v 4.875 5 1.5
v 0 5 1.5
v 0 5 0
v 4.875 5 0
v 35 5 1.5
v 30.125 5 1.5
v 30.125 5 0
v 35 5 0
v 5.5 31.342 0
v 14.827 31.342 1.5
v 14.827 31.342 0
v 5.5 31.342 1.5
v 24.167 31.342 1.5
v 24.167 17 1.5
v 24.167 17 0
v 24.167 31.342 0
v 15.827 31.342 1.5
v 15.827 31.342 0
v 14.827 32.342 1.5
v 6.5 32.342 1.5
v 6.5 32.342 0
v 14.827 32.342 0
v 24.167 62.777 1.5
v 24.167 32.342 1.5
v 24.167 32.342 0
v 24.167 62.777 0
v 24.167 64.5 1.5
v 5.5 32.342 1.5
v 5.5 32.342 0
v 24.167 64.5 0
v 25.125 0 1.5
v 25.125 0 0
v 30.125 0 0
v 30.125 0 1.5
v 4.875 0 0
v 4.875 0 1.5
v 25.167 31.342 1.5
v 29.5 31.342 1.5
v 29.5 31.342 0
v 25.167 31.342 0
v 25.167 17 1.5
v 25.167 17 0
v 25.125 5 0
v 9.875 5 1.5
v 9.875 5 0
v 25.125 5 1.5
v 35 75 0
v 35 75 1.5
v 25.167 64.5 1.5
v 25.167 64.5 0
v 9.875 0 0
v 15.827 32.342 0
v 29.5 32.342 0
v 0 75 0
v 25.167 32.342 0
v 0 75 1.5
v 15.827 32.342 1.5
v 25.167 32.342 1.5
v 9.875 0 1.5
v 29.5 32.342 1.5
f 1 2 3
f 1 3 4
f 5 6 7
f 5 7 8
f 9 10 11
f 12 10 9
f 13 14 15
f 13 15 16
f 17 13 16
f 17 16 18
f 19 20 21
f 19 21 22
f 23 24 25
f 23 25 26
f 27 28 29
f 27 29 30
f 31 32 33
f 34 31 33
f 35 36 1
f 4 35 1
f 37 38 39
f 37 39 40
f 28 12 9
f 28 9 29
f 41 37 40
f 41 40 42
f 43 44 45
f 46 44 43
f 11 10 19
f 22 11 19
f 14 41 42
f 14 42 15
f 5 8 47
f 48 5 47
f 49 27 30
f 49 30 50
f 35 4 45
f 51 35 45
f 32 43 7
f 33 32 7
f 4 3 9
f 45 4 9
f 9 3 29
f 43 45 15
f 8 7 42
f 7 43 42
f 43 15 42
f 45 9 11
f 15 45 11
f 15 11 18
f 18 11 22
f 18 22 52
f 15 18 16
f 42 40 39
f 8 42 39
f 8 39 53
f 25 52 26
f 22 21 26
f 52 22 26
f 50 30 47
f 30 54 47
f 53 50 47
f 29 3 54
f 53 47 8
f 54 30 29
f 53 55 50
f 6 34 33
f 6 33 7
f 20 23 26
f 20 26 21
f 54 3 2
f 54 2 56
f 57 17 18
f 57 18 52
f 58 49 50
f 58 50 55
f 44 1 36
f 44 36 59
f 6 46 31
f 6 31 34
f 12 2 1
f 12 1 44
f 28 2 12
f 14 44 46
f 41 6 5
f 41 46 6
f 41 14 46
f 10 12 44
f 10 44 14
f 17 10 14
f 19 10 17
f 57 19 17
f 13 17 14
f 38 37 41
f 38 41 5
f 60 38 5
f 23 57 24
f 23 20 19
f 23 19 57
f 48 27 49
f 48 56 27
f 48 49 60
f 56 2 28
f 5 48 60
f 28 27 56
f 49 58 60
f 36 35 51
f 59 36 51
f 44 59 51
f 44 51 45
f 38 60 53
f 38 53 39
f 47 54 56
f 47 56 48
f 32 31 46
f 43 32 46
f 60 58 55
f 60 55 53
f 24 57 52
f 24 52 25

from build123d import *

# Parameters (mm, degrees)
SKIZZE1_W                        = 35
SKIZZE1_H                        = 75
AUFSATZ_LINEAR_AUSTRAGEN1_DEPTH  = 1.5
SKIZZE3_W                        = 15.25
SKIZZE3_H                        = 5
SKIZZE3_W_2                      = 4.875
SCHNITT_LINEAR_AUSTRAGEN12_DEPTH = 20
SCHNITT_LINEAR_AUSTRAGEN15_DEPTH = 1.5
SKIZZE9_W                        = 1
SKIZZE9_H                        = 5.796251951
AUFSATZ_LINEAR_AUSTRAGEN6_DEPTH  = 1.5


with BuildPart() as part:
    # Skizze1 → Aufsatz-Linear austragen1 (new body)
    with BuildSketch(Plane.XY):
        with Locations((17.5, 37.5)):
            Rectangle(SKIZZE1_W, SKIZZE1_H)
    extrude(amount=AUFSATZ_LINEAR_AUSTRAGEN1_DEPTH)

    # Skizze3 → Schnitt-Linear austragen12 (cut)
    with BuildSketch(Plane.XY.offset(1.5)):
        with Locations((17.5, 2.5)):
            Rectangle(SKIZZE3_W, SKIZZE3_H)
        with Locations((32.5625, 2.5)):
            Rectangle(SKIZZE3_W_2, SKIZZE3_H)
        with Locations((2.4375, 2.5)):
            Rectangle(SKIZZE3_W_2, SKIZZE3_H)
    extrude(amount=-SCHNITT_LINEAR_AUSTRAGEN12_DEPTH, mode=Mode.SUBTRACT)

    # Skizze8 → Schnitt-Linear austragen15 (cut)
    with BuildSketch(Plane.XY.offset(1.5)):
        Polygon((5.5, 32.342192337), (24.167481122, 64.5), (25.167481122, 64.5), (25.167481122, 32.342192337), (29.5, 32.342192337), (29.5, 31.342192337), (25.167481122, 31.342192337), (25.167481122, 17), (24.167481122, 17), (24.167481122, 31.342192337), (5.5, 31.342192337), align=None)
        Polygon((6.5, 32.342192337), (24.167481122, 32.342192337), (24.167481122, 62.777335466), align=None, mode=Mode.SUBTRACT)
    extrude(amount=-SCHNITT_LINEAR_AUSTRAGEN15_DEPTH, mode=Mode.SUBTRACT)


with BuildPart() as schnitt_linear_austragen15_piece_1:
    # of the separate pieces the step leaves, piece 1, a body of its own (schnitt_linear_austragen15_pieces)
    add(part.part.solids().sort_by_distance((4.875, 0, 0))[0])



with BuildPart() as schnitt_linear_austragen15_piece_2:
    # of the separate pieces the step leaves, piece 2, a body of its own (schnitt_linear_austragen15_pieces)
    add(part.part.solids().sort_by_distance((24.167481122, 62.777335466, 0))[0])


with BuildPart() as schnitt_linear_austragen15_piece_1_1:
    add(schnitt_linear_austragen15_piece_1.part)

    add(schnitt_linear_austragen15_piece_2.part)  # Aufsatz-Linear austragen6 merges Schnitt-Linear austragen15 piece 2
    # Skizze9 → Aufsatz-Linear austragen6 (add)
    with BuildSketch(Plane.XY.offset(1.5)):
        with Locations((15.327481122, 31.334841656)):
            Rectangle(SKIZZE9_W, SKIZZE9_H)
    extrude(amount=-AUFSATZ_LINEAR_AUSTRAGEN6_DEPTH)


solid = schnitt_linear_austragen15_piece_1_1.part
